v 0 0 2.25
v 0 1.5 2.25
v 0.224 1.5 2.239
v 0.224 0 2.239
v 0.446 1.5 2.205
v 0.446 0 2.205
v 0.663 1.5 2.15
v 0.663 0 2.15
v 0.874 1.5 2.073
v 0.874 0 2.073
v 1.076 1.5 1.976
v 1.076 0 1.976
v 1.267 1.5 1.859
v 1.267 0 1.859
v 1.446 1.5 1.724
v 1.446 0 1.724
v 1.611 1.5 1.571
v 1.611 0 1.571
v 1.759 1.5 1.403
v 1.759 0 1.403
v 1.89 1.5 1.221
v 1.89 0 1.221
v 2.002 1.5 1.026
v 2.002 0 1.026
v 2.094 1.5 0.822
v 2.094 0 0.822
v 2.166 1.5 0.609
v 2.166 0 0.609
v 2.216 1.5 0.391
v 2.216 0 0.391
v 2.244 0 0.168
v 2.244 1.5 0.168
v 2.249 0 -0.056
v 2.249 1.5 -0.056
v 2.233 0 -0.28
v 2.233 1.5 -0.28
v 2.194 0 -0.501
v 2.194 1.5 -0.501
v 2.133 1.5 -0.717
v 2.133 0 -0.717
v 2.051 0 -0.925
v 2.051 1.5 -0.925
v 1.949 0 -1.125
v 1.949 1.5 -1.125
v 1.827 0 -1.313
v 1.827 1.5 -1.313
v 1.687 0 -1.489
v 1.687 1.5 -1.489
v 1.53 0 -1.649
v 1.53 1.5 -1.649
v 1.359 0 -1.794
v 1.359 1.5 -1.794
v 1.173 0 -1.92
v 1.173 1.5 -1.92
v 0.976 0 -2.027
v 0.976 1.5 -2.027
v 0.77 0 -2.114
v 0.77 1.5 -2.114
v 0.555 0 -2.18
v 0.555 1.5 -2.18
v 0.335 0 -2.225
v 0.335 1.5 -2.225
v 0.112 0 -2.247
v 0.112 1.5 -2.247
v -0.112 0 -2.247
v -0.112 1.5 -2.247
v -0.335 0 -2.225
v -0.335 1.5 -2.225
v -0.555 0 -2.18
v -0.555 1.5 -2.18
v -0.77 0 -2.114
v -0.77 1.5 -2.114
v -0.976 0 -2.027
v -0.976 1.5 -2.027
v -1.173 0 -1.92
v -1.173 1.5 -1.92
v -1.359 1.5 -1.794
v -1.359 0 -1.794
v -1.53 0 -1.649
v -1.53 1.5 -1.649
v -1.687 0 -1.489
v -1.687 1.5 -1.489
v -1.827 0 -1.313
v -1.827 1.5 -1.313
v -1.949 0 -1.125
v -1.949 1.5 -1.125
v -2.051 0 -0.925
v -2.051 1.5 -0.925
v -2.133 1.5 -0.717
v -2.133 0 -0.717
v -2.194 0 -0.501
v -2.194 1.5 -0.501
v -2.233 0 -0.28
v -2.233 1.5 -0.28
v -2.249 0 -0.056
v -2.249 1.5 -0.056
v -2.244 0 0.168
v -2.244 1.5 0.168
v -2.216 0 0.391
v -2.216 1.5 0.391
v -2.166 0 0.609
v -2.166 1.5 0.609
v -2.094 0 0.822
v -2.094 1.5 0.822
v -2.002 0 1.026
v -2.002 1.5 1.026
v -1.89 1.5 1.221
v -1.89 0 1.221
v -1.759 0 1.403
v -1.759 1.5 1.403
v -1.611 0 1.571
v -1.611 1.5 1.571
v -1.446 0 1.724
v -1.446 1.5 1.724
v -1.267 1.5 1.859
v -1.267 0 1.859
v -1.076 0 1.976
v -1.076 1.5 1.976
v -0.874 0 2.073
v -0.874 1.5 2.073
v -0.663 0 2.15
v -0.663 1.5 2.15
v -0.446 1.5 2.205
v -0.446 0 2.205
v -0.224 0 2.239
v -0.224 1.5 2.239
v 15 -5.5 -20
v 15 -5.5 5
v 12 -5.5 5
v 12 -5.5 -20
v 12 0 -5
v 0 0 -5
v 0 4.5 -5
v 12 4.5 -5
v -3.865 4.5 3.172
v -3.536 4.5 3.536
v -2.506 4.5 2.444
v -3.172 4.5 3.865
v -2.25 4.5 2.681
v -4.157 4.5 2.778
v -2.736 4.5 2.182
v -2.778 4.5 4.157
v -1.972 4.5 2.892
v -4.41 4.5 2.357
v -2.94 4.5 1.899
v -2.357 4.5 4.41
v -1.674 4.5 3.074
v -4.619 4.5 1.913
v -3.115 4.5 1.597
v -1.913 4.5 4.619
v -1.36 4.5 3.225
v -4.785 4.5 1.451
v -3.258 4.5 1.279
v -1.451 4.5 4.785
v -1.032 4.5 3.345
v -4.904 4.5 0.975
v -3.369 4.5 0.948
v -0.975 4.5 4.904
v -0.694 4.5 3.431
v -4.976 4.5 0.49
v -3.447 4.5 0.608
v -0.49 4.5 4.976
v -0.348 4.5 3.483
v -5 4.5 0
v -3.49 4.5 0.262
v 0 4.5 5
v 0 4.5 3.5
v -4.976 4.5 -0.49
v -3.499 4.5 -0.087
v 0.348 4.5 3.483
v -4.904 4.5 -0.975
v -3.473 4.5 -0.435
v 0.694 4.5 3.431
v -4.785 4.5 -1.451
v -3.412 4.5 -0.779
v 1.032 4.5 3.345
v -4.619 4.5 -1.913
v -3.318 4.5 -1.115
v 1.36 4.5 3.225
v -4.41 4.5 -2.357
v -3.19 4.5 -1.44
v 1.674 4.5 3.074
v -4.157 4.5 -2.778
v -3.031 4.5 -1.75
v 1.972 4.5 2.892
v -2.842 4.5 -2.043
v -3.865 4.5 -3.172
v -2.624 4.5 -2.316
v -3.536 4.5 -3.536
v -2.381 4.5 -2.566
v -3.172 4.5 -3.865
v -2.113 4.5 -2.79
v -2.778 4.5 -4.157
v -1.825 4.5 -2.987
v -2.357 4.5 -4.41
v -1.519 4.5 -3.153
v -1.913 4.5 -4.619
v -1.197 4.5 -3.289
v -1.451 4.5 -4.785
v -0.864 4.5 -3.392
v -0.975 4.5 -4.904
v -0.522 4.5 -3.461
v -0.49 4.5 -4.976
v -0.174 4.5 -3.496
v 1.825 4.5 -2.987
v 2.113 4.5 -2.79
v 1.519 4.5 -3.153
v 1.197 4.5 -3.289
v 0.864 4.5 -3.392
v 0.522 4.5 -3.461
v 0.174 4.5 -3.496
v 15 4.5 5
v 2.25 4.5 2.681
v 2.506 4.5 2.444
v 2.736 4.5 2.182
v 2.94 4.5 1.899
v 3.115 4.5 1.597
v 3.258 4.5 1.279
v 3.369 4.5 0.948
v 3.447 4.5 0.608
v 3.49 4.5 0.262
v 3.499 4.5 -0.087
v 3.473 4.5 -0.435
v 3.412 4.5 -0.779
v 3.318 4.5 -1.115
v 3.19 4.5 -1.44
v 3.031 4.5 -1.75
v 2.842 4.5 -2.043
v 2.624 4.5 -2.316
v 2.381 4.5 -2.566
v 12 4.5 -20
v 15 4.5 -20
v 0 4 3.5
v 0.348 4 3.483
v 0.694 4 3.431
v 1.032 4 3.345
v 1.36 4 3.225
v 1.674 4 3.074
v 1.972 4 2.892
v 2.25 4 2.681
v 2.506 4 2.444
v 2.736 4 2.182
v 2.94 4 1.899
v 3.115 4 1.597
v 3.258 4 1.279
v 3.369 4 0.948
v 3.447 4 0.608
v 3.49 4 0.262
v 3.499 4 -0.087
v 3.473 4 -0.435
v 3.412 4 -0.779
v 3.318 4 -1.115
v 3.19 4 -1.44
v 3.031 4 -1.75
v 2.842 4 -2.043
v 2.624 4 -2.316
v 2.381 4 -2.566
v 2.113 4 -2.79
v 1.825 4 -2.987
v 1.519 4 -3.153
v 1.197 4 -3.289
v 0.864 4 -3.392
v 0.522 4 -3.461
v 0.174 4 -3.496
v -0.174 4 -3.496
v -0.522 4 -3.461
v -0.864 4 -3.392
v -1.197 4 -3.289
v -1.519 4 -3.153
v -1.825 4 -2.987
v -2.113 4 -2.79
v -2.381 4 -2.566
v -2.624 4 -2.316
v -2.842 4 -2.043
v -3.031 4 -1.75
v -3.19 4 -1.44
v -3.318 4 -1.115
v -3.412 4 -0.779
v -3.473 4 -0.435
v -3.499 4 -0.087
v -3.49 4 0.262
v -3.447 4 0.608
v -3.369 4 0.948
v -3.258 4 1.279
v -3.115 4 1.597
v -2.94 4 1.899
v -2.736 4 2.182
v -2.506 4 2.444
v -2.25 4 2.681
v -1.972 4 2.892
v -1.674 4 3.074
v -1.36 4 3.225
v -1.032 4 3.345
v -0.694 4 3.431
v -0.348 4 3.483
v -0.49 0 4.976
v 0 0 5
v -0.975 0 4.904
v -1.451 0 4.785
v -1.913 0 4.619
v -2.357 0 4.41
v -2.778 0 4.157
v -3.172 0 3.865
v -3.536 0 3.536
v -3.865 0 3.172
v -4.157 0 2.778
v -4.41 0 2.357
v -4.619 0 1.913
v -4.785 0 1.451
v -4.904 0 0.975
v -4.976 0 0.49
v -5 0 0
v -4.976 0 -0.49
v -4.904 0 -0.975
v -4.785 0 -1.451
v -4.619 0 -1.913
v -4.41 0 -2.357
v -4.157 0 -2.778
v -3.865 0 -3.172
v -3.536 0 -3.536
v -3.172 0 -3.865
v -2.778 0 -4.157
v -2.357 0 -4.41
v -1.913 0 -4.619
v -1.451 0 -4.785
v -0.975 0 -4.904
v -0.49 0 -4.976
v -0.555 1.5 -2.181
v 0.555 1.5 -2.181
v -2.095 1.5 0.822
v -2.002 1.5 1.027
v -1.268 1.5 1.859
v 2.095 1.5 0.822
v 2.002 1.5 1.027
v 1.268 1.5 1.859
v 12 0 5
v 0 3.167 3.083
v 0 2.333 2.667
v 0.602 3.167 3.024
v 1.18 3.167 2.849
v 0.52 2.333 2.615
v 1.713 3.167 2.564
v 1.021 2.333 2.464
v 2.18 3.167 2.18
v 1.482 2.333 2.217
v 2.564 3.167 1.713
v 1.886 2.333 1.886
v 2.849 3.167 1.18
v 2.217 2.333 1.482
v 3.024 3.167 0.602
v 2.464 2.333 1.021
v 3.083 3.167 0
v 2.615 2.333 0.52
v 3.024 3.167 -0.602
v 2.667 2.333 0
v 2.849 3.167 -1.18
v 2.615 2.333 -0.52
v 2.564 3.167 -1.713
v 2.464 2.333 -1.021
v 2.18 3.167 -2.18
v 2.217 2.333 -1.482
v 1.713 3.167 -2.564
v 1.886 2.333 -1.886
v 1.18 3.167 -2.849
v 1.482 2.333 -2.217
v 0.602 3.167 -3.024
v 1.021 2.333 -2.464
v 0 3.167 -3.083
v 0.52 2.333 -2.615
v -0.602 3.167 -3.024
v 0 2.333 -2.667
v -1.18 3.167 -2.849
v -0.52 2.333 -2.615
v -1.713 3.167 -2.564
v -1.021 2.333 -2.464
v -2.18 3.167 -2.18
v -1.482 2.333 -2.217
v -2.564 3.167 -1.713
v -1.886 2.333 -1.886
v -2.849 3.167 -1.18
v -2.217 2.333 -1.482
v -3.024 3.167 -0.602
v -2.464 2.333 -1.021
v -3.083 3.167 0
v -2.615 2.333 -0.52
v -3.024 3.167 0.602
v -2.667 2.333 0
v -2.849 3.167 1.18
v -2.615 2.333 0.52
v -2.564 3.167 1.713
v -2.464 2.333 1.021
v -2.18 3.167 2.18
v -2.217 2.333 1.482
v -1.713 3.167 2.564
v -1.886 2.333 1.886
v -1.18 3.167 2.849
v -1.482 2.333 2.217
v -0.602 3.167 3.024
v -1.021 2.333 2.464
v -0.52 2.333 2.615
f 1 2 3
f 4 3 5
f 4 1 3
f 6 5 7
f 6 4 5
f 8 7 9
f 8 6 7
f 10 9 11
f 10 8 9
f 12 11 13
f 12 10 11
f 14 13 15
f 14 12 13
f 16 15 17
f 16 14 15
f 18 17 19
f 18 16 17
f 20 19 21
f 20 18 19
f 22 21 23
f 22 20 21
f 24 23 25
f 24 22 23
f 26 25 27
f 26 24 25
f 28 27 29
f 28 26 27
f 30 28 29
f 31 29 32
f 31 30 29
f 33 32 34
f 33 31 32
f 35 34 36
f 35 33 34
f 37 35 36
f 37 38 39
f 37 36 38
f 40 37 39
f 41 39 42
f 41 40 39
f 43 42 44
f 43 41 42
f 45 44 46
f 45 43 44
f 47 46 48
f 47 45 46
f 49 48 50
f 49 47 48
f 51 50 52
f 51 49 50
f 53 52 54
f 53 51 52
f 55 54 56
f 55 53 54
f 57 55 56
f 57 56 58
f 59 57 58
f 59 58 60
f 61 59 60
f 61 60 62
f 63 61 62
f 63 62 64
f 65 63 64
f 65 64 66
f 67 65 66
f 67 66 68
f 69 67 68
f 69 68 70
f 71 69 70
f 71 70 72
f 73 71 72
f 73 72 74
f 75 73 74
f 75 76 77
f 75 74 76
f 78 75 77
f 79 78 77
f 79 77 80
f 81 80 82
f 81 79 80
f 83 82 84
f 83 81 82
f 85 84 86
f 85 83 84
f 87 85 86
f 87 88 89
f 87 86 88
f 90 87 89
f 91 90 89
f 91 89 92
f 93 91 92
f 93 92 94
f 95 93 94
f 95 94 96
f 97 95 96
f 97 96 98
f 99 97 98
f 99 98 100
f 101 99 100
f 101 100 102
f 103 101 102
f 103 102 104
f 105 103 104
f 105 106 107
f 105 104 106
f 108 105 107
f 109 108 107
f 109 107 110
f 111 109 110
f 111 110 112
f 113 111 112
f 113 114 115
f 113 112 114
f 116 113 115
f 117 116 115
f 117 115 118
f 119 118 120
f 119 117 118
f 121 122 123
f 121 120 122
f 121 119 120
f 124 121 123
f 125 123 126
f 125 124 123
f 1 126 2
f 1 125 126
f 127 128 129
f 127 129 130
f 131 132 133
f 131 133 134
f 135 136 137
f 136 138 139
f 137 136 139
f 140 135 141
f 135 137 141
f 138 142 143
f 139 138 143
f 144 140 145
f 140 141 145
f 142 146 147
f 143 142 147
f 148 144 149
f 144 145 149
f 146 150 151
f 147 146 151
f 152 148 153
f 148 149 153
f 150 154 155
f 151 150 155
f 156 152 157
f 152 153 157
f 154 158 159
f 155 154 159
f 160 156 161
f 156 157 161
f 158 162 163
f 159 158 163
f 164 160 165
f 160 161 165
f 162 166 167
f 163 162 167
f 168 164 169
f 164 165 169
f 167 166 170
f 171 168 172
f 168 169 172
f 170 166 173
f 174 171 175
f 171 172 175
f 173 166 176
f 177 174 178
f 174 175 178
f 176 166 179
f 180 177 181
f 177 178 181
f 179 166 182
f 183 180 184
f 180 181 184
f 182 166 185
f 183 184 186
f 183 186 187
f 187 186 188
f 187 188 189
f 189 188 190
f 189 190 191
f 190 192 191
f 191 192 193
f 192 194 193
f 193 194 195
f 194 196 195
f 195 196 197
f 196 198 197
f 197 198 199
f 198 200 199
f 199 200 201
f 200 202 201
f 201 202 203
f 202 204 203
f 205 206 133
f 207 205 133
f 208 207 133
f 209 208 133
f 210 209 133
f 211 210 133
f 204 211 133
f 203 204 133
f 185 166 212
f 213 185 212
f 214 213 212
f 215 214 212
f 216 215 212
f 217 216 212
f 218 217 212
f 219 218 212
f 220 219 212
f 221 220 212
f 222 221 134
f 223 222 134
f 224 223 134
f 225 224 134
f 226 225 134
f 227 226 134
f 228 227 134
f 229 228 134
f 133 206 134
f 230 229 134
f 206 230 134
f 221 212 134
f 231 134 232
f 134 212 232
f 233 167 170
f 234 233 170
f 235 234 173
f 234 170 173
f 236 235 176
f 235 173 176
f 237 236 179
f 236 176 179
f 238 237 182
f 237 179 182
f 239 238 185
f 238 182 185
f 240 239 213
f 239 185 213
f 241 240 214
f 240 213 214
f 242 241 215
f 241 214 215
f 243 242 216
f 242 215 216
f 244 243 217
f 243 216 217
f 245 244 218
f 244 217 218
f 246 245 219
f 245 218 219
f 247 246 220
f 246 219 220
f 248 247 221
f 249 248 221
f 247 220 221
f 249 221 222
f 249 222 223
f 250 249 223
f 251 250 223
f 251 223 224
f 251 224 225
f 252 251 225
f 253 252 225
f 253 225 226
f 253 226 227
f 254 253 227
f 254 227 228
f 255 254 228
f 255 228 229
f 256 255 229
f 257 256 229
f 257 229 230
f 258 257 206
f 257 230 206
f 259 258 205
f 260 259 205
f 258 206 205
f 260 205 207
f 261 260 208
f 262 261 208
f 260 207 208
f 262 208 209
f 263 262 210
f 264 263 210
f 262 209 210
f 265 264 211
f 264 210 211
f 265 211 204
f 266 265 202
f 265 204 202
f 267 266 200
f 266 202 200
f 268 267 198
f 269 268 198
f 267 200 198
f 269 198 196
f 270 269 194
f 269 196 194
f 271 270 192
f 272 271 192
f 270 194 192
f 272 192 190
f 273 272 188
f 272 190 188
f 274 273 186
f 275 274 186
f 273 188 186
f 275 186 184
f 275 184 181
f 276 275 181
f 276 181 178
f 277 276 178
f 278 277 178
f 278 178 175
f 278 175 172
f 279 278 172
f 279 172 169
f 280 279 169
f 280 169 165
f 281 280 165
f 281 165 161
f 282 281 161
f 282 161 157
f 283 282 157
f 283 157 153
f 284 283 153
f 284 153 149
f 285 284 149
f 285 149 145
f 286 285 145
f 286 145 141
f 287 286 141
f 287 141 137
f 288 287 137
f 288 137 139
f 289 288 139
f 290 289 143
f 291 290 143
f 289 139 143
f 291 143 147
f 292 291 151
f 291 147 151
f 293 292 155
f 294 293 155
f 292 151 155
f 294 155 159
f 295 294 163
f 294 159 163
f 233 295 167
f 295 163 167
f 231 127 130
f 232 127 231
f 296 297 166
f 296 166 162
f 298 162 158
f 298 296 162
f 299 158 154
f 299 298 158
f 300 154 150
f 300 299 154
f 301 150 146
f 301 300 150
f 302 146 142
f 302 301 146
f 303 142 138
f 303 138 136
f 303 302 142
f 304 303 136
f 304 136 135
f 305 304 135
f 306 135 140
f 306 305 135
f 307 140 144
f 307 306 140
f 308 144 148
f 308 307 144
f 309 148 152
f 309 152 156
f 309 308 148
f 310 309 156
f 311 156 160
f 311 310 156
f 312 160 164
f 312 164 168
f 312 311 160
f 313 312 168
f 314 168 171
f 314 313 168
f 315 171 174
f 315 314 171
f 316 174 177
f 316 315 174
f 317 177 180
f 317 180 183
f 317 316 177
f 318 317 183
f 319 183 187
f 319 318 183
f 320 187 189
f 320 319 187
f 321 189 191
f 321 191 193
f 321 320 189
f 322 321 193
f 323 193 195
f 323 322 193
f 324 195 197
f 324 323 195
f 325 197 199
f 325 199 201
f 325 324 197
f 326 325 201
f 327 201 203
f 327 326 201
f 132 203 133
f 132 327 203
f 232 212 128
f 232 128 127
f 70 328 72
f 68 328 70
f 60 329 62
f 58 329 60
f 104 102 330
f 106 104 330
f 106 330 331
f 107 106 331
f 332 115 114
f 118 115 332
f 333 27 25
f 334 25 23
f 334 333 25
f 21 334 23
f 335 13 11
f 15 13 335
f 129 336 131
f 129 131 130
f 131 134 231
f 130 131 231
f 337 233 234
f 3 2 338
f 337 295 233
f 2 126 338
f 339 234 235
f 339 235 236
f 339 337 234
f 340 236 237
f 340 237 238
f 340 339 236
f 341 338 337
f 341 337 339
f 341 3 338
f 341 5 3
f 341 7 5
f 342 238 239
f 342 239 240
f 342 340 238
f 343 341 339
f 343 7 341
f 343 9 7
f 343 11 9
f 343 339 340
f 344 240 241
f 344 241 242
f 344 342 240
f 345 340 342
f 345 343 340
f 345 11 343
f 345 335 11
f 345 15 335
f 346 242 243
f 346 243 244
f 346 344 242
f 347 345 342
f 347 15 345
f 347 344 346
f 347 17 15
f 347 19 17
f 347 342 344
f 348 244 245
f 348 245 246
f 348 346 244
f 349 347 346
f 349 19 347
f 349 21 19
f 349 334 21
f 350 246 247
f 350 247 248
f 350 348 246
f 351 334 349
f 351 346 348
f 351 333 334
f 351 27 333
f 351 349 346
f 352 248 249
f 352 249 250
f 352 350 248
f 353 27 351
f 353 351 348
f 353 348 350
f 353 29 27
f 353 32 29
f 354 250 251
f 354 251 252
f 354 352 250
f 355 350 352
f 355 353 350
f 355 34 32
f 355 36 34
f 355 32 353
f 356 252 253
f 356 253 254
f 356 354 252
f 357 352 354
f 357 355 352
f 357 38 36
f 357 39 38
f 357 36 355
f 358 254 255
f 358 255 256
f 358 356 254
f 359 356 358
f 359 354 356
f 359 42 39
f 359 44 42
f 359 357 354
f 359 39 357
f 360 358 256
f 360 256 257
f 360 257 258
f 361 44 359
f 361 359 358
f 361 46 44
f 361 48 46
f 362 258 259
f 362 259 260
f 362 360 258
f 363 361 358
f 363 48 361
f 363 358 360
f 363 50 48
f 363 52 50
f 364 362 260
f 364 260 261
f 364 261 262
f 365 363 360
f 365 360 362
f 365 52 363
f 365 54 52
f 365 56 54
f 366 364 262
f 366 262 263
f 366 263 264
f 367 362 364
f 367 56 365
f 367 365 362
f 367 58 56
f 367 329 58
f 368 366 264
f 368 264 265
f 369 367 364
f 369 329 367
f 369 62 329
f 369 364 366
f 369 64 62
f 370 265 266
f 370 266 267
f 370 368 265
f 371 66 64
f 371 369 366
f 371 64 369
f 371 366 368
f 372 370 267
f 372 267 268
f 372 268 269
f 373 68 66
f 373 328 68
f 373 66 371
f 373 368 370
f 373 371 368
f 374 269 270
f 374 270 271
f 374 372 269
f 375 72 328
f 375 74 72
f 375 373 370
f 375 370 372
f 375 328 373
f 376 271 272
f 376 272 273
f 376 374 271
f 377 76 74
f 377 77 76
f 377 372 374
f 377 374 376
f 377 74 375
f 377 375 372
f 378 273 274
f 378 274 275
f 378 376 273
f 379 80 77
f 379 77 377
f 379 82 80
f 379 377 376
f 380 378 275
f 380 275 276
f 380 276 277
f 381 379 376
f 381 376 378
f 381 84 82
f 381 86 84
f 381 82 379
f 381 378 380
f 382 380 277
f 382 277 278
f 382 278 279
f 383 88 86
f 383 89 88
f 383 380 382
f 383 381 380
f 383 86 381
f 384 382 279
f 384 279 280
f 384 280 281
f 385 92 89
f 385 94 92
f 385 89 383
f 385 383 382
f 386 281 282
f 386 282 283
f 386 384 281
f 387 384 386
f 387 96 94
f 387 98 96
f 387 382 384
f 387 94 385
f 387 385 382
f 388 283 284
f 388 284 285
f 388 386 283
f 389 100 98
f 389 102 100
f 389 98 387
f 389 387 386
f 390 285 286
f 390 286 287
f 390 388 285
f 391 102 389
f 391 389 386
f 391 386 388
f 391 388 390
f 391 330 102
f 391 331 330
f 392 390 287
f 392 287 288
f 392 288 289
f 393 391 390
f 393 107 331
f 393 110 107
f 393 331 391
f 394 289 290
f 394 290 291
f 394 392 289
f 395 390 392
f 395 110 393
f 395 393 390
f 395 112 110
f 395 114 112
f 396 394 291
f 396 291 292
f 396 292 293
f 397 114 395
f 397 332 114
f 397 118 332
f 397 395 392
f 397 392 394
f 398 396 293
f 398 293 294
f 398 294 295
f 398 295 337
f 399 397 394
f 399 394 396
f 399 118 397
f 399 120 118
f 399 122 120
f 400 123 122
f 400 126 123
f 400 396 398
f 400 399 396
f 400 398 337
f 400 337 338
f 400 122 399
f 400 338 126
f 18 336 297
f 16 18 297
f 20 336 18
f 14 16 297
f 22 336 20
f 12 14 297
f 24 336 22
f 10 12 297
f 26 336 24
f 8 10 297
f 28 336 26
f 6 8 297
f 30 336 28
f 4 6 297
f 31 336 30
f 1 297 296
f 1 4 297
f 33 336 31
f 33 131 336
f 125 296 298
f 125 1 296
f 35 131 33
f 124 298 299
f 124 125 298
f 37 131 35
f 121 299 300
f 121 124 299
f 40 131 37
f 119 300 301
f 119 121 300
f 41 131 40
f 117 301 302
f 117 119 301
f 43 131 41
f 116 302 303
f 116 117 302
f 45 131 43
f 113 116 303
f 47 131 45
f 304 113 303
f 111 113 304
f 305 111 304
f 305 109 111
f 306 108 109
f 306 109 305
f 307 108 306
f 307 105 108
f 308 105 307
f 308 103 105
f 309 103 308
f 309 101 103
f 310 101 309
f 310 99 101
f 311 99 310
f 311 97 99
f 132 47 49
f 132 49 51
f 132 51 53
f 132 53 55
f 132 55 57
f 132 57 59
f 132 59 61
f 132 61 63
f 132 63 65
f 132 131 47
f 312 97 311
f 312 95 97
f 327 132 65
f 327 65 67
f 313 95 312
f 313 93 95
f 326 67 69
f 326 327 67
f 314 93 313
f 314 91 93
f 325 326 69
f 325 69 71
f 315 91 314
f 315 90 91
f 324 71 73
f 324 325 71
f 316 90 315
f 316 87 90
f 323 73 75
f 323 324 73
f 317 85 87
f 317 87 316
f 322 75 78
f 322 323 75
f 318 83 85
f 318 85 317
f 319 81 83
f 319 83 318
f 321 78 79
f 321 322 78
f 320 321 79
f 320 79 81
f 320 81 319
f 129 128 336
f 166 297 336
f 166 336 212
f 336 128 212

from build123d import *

# Parameters (mm, degrees)
SKETCH1_R           = 2.25
BOSS_EXTRUDE1_DEPTH = 4.5
SKETCH2_W           = 25
SKETCH2_H           = 10
BOSS_EXTRUDE2_DEPTH = 3
SKETCH3_R           = 3.5
CUT_EXTRUDE1_DEPTH  = 3
CHAMFER1_SIZE2      = 1.25
CHAMFER1_SIZE       = 2.5


with BuildPart() as part:
    # Sketch1 → Boss-Extrude1 (new body)
    with BuildSketch(Plane(origin=(0, 0, 0), x_dir=(1, 0, 0), z_dir=(0, 1, 0))):
        with BuildLine():
            Line((0, 5), (15, 5))
            Line((15, 5), (15, -5))
            Line((15, -5), (0, -5))
            ThreePointArc((0, -5), (-5, 0), (0, 5))
        make_face()
        with Locations(Location((0, 0, 0), (0, 0, 270))):
            Circle(SKETCH1_R, mode=Mode.SUBTRACT)
    extrude(amount=BOSS_EXTRUDE1_DEPTH)

    # Sketch2 → Boss-Extrude2 (add)
    with BuildSketch(Plane(origin=(15, 0, 0), x_dir=(0, 0, -1), z_dir=(1, 0, 0))):
        with Locations((7.5, -0.5)):
            Rectangle(SKETCH2_W, SKETCH2_H)
    extrude(amount=-BOSS_EXTRUDE2_DEPTH)

    # Sketch3 → Cut-Extrude1 (cut)
    with BuildSketch(Plane(origin=(0, 4.5, 0), x_dir=(1, 0, 0), z_dir=(0, 1, 0))):
        with Locations(Location((0, 0, 0), (0, 0, 270))):
            Circle(SKETCH3_R)
    extrude(amount=-CUT_EXTRUDE1_DEPTH, mode=Mode.SUBTRACT)

    # Chamfer1
    chamfer1_edges = [part.edges().sort_by_distance(p)[0] for p in [
        (0, 1.5, -3.5),
    ]]
    chamfer1_side = [part.faces().sort_by_distance(p)[0] for p in [
        (0, 1.525, -3.5),
    ]]
    chamfer(chamfer1_edges, length=CHAMFER1_SIZE - 0.0001, length2=CHAMFER1_SIZE2 - 0.0001, reference=chamfer1_side[0])  # a hair under: the kernel refuses the full size


solid = part.part
